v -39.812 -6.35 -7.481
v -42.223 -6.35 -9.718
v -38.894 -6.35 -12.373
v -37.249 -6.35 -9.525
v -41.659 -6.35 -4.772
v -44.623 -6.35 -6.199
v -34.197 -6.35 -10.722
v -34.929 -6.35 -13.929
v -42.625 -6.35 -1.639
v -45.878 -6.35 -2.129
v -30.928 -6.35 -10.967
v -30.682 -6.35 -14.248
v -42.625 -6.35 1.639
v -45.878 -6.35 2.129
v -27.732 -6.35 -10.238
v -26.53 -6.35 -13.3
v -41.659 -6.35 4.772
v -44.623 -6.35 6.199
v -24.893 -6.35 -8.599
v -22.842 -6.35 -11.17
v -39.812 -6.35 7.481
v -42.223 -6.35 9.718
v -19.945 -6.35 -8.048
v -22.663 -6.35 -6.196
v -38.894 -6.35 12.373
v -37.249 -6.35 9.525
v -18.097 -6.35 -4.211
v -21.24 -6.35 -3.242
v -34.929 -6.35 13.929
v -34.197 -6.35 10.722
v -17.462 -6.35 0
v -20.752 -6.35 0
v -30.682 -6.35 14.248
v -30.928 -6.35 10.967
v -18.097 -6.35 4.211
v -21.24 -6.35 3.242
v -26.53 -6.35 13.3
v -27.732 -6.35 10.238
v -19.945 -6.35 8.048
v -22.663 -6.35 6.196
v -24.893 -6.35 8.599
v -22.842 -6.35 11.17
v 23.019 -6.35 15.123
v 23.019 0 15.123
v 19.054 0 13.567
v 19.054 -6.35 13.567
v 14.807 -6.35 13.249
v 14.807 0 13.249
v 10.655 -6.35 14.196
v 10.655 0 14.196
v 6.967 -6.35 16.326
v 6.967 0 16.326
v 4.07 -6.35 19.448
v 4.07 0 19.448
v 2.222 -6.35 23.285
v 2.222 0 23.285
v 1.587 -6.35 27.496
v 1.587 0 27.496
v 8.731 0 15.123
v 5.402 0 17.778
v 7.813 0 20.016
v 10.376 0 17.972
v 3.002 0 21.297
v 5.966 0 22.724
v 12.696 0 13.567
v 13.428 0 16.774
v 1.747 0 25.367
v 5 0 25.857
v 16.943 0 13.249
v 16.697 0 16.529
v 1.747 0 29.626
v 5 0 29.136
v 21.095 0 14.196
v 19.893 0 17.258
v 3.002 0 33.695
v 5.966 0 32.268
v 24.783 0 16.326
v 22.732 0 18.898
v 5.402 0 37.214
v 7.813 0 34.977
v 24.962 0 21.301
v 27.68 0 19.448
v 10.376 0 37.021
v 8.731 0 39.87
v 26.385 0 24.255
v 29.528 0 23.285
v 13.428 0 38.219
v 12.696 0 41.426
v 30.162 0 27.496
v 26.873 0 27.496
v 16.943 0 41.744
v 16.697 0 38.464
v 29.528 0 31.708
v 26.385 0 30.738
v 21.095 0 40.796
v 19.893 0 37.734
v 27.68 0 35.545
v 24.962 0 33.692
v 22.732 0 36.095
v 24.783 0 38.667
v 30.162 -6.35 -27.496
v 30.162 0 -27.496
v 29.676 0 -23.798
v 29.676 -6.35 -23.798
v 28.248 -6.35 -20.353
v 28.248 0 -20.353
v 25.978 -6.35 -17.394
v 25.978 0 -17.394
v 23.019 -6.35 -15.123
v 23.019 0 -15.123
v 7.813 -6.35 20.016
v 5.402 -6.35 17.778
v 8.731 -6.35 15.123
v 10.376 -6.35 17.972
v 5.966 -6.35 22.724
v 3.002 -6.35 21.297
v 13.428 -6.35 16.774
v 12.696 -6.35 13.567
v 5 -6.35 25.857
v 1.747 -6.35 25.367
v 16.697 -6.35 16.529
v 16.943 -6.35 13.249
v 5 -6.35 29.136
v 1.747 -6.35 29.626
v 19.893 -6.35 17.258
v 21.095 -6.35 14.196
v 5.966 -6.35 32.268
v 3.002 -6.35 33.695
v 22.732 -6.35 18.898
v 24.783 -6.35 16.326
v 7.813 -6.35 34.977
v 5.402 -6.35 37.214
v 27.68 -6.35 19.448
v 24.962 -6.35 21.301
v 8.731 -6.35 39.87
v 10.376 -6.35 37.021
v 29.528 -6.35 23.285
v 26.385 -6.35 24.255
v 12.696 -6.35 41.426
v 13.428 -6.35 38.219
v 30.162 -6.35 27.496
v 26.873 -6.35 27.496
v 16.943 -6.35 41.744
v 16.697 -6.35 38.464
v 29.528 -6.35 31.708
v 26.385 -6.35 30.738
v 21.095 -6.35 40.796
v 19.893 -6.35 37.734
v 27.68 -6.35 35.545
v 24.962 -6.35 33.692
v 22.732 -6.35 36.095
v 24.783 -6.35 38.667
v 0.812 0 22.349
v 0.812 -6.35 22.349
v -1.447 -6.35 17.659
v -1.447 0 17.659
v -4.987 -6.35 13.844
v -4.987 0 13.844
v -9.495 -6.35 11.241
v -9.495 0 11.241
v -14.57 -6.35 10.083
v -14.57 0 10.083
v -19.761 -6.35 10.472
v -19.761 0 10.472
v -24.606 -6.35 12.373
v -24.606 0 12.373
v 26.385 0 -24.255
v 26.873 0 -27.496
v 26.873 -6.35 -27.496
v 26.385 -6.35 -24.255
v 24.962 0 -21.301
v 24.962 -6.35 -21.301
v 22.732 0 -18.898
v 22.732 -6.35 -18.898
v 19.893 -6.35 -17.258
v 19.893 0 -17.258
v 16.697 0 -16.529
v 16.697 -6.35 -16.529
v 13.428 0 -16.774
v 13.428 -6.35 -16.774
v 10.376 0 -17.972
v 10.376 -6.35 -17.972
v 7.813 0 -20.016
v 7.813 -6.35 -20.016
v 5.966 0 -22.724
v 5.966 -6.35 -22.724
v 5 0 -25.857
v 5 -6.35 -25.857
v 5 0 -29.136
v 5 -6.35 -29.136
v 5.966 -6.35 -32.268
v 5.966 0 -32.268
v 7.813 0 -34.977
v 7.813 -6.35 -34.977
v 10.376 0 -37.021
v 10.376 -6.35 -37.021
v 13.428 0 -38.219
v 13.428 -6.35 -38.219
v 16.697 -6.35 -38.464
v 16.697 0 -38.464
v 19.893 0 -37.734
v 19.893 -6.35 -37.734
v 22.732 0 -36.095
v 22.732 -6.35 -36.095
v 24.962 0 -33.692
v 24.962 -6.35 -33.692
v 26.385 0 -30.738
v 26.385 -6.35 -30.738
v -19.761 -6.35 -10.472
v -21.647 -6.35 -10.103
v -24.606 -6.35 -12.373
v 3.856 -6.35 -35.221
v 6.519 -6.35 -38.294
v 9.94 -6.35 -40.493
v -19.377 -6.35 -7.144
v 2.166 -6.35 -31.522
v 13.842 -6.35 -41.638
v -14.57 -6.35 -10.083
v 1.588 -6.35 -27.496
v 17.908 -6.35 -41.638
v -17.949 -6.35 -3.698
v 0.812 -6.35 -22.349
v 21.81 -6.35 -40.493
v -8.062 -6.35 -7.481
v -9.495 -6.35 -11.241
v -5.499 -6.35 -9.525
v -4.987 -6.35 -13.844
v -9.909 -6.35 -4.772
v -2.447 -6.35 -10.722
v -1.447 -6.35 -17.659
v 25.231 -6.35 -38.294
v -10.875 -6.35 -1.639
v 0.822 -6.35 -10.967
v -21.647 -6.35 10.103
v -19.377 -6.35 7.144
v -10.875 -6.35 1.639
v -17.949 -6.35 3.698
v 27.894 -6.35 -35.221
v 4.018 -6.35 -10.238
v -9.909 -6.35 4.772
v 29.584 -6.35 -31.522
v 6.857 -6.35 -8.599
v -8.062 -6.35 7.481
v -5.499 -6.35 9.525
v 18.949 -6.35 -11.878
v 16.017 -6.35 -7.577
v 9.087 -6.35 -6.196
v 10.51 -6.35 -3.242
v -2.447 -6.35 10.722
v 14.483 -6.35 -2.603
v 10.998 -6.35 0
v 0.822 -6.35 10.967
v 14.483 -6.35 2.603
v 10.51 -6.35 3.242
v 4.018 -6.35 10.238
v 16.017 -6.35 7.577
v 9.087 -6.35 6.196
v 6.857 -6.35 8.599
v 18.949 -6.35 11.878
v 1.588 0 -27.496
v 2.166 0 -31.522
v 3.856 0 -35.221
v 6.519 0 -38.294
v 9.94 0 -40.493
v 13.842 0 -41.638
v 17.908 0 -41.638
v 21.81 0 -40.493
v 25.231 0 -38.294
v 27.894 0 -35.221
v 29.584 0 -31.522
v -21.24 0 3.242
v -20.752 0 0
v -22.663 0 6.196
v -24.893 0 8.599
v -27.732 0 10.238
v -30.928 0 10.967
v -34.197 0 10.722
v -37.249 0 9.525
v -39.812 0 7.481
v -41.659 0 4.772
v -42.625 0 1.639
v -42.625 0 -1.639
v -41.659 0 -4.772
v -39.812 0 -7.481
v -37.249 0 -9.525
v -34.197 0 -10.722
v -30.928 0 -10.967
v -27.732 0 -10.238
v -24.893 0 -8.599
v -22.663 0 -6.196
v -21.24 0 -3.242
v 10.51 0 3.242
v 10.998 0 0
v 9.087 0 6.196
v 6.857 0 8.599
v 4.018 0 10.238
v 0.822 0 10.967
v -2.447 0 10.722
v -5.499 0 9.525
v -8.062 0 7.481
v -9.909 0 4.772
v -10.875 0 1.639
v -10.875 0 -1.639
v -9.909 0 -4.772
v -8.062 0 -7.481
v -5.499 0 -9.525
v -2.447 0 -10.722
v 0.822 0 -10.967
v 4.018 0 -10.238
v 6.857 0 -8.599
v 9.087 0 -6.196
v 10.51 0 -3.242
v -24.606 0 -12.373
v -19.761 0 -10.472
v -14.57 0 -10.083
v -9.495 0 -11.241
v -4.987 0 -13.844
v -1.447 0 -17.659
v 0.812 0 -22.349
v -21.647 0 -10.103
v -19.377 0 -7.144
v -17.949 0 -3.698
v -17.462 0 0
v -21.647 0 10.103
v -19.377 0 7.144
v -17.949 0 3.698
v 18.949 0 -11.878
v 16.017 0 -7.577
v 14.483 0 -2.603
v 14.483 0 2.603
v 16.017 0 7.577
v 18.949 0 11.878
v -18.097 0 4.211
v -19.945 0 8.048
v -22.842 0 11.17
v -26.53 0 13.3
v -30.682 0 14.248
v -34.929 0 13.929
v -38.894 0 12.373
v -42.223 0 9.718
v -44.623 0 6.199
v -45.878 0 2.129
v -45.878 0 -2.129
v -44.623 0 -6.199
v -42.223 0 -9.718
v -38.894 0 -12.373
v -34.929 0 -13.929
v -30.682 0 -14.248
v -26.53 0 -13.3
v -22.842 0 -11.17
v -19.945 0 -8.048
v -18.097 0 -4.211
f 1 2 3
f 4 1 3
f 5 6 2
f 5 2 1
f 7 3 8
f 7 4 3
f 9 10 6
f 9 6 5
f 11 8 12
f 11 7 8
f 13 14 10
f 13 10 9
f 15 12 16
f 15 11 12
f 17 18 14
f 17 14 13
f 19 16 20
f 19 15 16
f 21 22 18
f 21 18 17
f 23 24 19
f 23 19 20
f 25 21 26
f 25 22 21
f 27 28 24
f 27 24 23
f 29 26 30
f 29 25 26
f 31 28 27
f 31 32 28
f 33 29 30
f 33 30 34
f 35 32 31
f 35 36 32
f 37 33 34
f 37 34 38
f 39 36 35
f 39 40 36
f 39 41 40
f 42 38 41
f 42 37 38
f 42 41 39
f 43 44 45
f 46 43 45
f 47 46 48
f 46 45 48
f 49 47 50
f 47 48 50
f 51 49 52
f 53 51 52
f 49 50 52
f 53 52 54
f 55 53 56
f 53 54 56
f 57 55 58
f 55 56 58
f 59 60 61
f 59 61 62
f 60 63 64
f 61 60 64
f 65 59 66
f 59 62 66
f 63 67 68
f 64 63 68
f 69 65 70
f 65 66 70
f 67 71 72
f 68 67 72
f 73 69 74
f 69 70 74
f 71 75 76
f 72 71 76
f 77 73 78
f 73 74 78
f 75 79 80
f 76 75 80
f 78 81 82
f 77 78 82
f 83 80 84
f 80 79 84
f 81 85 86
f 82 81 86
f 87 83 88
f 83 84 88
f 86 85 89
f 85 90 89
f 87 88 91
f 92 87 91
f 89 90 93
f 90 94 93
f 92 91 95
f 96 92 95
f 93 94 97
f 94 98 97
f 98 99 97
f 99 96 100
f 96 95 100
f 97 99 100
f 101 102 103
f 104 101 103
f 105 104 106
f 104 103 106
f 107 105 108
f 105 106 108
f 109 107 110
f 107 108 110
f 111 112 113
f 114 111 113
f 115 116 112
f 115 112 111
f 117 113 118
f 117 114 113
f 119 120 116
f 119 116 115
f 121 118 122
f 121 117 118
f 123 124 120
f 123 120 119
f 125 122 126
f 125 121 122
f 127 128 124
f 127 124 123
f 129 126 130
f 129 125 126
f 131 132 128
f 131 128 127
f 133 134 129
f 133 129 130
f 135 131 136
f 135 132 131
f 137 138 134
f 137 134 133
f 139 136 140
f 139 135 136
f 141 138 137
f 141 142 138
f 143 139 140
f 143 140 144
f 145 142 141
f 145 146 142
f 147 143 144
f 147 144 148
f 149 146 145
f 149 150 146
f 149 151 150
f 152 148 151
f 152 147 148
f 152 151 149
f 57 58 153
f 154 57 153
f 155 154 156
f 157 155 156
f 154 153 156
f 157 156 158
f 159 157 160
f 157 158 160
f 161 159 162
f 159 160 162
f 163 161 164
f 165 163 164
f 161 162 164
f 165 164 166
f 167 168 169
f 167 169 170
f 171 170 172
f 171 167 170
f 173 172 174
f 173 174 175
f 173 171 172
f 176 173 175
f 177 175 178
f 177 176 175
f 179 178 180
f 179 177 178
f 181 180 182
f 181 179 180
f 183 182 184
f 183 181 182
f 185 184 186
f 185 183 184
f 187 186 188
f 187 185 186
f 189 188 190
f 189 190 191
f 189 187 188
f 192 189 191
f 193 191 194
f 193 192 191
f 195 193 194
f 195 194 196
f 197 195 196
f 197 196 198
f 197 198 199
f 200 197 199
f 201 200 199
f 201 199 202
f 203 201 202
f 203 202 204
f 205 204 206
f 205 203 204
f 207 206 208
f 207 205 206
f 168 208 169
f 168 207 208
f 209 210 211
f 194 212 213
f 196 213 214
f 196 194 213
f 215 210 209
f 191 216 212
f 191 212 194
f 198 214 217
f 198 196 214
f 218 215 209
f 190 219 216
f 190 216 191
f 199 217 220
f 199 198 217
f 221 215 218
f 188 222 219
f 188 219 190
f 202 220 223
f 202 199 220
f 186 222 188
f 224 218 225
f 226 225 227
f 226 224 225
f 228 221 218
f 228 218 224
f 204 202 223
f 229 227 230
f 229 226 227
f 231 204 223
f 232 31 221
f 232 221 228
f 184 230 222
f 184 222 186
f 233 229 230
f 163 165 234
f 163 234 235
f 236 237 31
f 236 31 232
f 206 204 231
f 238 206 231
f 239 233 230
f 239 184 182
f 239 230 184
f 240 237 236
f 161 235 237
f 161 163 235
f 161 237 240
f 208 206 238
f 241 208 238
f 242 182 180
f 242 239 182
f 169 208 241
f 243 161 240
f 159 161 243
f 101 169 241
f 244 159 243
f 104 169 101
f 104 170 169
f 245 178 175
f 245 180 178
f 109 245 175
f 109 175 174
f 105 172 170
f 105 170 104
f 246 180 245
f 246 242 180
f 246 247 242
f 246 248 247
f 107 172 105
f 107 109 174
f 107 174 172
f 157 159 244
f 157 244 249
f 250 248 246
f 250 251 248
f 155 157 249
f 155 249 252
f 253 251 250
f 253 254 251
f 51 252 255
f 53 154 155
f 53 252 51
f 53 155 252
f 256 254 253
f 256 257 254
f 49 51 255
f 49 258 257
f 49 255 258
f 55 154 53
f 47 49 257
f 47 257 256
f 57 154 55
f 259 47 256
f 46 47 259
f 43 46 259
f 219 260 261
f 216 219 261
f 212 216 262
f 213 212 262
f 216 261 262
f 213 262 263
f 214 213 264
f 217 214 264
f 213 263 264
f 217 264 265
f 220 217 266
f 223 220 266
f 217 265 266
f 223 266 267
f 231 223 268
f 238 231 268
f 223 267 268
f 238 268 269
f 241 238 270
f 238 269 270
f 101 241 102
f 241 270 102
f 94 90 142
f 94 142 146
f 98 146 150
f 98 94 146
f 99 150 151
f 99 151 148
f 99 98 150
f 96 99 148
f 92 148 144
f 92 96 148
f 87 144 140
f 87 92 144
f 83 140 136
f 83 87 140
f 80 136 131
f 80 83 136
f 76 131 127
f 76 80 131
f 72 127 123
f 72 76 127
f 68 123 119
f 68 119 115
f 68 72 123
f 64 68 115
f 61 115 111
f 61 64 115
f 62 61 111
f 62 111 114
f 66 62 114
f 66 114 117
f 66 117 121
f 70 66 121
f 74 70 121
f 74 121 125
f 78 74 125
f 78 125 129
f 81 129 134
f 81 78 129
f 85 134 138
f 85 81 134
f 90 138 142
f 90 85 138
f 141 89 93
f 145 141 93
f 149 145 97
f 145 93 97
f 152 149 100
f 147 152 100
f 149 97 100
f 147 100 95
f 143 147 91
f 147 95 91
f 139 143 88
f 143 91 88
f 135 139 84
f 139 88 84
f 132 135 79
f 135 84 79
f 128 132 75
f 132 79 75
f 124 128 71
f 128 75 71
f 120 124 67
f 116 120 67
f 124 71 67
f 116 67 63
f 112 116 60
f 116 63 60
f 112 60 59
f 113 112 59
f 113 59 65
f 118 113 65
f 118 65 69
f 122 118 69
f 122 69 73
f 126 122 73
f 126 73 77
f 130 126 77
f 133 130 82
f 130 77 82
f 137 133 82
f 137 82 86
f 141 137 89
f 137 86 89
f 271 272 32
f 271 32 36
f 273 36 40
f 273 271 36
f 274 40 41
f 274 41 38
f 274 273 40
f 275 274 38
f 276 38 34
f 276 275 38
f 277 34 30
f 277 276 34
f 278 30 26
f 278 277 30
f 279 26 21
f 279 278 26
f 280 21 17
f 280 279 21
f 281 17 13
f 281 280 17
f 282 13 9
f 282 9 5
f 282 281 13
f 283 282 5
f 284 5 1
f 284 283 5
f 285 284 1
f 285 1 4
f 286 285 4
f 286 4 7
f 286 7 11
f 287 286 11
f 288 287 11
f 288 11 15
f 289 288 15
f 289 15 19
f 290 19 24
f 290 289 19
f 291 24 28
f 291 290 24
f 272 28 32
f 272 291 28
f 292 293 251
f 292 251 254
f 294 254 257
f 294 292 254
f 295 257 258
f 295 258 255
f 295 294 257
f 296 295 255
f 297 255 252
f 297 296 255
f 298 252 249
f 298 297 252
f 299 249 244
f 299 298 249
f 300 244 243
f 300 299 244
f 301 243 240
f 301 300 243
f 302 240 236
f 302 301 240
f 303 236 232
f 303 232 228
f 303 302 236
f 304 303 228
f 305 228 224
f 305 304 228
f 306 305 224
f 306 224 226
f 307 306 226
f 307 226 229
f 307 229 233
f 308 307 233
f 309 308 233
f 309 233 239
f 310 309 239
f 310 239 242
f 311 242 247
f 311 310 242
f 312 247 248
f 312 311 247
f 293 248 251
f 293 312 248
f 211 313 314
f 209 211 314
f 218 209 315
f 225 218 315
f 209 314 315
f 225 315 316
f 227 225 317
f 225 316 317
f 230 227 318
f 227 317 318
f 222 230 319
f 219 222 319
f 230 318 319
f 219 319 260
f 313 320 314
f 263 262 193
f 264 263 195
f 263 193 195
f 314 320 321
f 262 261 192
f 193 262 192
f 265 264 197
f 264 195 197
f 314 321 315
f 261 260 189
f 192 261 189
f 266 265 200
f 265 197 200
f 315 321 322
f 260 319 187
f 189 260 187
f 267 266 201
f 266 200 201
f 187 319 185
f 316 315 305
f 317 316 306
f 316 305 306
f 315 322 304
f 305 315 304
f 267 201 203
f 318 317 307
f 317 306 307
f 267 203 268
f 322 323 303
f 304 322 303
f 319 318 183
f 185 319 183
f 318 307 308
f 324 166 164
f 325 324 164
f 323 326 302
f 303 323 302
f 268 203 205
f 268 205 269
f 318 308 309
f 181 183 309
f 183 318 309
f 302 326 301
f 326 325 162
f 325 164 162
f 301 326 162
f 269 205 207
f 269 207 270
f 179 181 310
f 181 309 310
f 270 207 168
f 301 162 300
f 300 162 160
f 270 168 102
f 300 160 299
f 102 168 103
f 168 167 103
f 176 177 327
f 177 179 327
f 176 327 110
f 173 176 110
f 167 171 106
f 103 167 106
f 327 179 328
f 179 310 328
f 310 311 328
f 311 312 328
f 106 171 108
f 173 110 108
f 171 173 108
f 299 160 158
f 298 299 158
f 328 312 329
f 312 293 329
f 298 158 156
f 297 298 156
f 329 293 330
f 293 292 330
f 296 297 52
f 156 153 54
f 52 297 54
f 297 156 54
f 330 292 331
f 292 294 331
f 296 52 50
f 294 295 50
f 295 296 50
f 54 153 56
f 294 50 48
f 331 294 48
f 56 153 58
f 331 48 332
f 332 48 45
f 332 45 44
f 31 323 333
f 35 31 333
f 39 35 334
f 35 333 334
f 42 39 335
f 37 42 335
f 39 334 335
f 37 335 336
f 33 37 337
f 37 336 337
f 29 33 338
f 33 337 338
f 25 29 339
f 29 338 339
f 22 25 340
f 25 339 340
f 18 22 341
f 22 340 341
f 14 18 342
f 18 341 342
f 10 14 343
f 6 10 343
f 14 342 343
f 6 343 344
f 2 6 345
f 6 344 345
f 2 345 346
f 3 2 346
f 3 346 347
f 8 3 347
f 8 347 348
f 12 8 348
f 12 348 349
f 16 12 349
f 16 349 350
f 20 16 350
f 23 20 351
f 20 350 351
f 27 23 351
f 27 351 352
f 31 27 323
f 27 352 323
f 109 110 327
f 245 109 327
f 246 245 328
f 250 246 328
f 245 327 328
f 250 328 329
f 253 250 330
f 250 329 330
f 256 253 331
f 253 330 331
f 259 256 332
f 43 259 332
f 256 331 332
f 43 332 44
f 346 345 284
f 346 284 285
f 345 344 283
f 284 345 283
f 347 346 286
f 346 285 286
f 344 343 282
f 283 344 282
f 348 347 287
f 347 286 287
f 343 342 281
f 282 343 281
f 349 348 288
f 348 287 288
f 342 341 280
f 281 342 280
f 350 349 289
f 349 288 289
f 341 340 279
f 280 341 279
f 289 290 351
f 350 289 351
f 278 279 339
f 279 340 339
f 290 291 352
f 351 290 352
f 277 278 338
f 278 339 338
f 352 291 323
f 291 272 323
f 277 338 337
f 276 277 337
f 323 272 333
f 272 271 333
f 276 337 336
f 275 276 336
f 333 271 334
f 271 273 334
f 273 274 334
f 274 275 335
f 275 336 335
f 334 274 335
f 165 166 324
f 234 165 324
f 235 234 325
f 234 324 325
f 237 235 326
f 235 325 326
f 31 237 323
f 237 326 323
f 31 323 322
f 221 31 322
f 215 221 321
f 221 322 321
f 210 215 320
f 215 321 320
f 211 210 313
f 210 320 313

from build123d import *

# Parameters (mm, degrees)
F1_R     = 10.9982
F2_DEPTH = 6.35
F0_R     = 14.2875
F0_R_2   = 10.9982


with BuildPart() as f2:
    # F1 (on face) → F2 (new body)
    with BuildSketch(Plane.XZ):
        with BuildLine():
            ThreePointArc((-24.60625, -12.3733379566), (-7.14375, -12.3733379566), (1.5875, -27.4963065702))
            ThreePointArc((1.5875, -27.4963065702), (8.73125, -15.1229686136), (23.01875, -15.1229686136))
            ThreePointArc((23.01875, -15.1229686136), (14.2875, 0), (23.01875, 15.1229686136))
            ThreePointArc((23.01875, 15.1229686136), (8.73125, 15.1229686136), (1.5875, 27.4963065702))
            ThreePointArc((1.5875, 27.4963065702), (-7.14375, 12.3733379566), (-24.60625, 12.3733379566))
            ThreePointArc((-24.60625, 12.3733379566), (-19.3766620434, 7.14375), (-17.4625, 0))
            ThreePointArc((-17.4625, 0), (-19.3766620434, -7.14375), (-24.60625, -12.3733379566))
        make_face()
        Circle(F1_R, mode=Mode.SUBTRACT)
        with BuildLine():
            ThreePointArc((23.01875, -15.1229686136), (8.73125, -15.1229686136), (1.5875, -27.4963065702))
            ThreePointArc((1.5875, -27.4963065702), (15.875, -41.7838065702), (30.1625, -27.4963065702))
            ThreePointArc((30.1625, -27.4963065702), (28.2483379566, -20.3525565702), (23.01875, -15.1229686136))
        make_face()
        with Locations((15.875, -27.4963065702)):
            Circle(F1_R, mode=Mode.SUBTRACT)
    extrude(amount=F2_DEPTH)


with BuildPart() as f2b:
    # F0 (on Front) → F2, piece 2 (new body)
    with BuildSketch(Plane.XZ):
        with Locations((-31.75, 0)):
            Circle(F0_R)
        with Locations((-31.75, 0)):
            Circle(F0_R_2, mode=Mode.SUBTRACT)
    extrude(amount=F2_DEPTH)


with BuildPart() as f2c:
    # F0 (on Front) → F2, piece 3 (new body)
    with BuildSketch(Plane.XZ):
        with Locations((15.875, 27.4963065702)):
            Circle(F0_R)
        with Locations((15.875, 27.4963065702)):
            Circle(F0_R_2, mode=Mode.SUBTRACT)
    extrude(amount=F2_DEPTH)


solid = Compound([f2.part, f2b.part, f2c.part])
